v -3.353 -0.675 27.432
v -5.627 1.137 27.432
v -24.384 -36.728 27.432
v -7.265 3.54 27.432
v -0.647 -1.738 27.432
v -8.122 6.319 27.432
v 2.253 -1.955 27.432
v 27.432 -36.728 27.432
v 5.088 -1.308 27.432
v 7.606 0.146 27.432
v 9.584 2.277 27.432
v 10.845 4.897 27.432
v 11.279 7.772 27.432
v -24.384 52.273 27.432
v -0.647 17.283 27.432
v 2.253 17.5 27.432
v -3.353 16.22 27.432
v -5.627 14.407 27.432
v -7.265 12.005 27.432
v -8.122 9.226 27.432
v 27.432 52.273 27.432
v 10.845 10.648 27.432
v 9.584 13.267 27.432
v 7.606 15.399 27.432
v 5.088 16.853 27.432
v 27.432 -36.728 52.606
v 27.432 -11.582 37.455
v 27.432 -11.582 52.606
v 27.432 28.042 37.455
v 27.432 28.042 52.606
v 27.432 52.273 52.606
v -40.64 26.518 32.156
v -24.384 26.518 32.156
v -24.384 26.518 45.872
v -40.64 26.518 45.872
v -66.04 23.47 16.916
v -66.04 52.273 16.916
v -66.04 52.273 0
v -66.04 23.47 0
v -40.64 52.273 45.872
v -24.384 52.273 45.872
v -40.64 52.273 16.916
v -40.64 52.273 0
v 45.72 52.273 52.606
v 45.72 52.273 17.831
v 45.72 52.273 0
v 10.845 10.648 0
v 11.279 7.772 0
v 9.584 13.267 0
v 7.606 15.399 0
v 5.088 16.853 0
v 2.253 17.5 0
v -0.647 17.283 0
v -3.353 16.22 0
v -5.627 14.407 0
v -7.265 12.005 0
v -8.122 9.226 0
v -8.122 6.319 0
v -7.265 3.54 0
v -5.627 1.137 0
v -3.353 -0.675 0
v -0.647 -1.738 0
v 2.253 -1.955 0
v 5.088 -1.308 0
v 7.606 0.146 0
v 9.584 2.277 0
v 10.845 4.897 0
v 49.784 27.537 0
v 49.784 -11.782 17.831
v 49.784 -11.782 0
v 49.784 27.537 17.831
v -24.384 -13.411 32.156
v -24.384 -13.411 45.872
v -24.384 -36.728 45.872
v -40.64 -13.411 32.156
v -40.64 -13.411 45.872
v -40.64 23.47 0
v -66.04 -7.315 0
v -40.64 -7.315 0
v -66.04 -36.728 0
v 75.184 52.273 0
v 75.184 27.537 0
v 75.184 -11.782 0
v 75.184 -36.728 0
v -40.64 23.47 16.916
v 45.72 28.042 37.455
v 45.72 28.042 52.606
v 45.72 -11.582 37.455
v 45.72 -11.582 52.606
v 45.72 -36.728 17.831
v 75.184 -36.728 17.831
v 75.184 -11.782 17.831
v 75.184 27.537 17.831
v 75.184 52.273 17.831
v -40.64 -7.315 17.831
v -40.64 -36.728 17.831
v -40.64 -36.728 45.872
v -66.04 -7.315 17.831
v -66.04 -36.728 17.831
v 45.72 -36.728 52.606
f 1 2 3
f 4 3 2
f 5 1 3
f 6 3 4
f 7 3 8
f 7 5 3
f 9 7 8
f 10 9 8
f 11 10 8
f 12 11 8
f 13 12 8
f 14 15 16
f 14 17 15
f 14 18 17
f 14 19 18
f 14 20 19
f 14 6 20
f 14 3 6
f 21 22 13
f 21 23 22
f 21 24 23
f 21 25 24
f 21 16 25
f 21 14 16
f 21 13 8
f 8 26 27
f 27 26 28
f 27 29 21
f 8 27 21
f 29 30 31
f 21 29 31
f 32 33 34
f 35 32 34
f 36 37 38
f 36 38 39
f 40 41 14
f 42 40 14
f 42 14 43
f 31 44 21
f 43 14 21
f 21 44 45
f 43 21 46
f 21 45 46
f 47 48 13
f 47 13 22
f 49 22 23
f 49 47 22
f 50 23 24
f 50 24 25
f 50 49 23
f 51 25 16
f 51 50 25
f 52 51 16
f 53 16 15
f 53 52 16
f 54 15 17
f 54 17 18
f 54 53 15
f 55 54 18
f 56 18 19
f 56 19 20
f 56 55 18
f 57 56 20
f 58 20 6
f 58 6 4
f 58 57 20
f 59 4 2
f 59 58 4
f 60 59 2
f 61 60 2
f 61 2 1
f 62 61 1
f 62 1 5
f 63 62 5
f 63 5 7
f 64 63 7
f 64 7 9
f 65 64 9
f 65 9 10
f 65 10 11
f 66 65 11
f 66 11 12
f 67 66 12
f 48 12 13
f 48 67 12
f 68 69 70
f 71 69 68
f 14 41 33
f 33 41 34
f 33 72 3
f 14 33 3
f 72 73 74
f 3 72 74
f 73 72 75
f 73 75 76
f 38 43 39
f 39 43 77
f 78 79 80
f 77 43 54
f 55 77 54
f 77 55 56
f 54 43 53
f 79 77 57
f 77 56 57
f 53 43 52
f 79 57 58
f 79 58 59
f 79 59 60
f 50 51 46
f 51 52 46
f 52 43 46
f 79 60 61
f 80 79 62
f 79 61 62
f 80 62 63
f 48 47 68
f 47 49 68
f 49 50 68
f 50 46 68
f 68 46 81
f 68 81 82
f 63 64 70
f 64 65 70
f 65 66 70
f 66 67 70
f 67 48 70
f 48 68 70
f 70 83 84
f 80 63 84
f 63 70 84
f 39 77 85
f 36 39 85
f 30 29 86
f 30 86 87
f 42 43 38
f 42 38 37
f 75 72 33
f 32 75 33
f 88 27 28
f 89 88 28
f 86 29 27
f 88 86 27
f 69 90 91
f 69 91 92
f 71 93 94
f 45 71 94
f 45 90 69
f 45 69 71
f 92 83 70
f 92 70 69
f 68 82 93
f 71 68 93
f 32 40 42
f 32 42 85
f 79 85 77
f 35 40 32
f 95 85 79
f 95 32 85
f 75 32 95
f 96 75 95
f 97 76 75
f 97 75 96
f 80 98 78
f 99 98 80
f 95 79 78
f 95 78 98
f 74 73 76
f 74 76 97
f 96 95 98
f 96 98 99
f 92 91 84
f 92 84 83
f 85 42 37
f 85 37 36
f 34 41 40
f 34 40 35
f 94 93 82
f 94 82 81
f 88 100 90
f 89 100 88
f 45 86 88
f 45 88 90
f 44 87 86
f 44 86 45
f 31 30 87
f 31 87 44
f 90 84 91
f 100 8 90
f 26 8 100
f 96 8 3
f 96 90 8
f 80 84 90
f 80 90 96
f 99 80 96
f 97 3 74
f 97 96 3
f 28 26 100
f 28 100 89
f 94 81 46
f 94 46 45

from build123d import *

# Parameters (mm, degrees)
F0_W      = 51.8160052598
F0_H      = 89.0015969053
F0_R      = 9.7547897259
F1_DEPTH  = 27.432
F2_W      = 25.1459991559
F2_H      = 15.1513946929
F2_W_2    = 24.2315987125
F3_DEPTH  = 18.288
F4_W      = 25.7555991411
F4_H      = 13.7160010636
F4_W_2    = 23.3171992004
F5_DEPTH  = 16.256
F6_W      = 89.0015969053
F6_H      = 17.8308002651
F7_DEPTH  = 4.064
F8_W      = 24.9466653913
F8_H      = 17.8308002651
F8_W_2    = 24.7357338667
F9_DEPTH  = 25.4
F10_W     = 28.8035981357
F10_H     = 16.9163998216
F10_W_2   = 29.4131976552
F10_H_2   = 17.8308002651
F11_DEPTH = 25.4


with BuildPart() as f1:
    # F0 (on Top) → F1 (new body)
    with BuildSketch(Plane.XY):
        with Locations((1.5240013599, 7.7724005096)):
            Rectangle(F0_W, F0_H)
        with Locations((1.5240013599, 7.7724005096)):
            Circle(F0_R, mode=Mode.SUBTRACT)
    extrude(amount=F1_DEPTH)

    # F2 (on face) → F3 (join)
    with BuildSketch(Plane.YZ.offset(27.4320039898)):
        with Locations((-24.1553983651, 45.0302423907)):
            Rectangle(F2_W, F2_H)
        Polygon((-11.5823987871, 37.4545450442), (-36.7283979431, 37.4545450442), (-36.7283979431, 0), (52.2731989622, 0), (52.2731989622, 37.4545450442), (28.0416002497, 37.4545450442), align=None)
        with Locations((40.157399606, 45.0302423907)):
            Rectangle(F2_W_2, F2_H)
    extrude(amount=F3_DEPTH)

    # F4 (on face) → F5 (join)
    with BuildSketch(Plane(origin=(-24.3840012699, 0, 0), x_dir=(0, -1, 0), z_dir=(-1, 0, 0))):
        with Locations((-39.3953993917, 39.0144009143)):
            Rectangle(F4_W, F4_H)
        Polygon((-26.5175998211, 32.1564003825), (-52.2731989622, 32.1564003825), (-52.2731989622, 0), (36.7283979431, 0), (36.7283979431, 32.1564003825), (13.4111987427, 32.1564003825), align=None)
        with Locations((25.0697983429, 39.0144009143)):
            Rectangle(F4_W_2, F4_H)
    extrude(amount=F5_DEPTH)

    # F6 (on face) → F7 (join)
    with BuildSketch(Plane.YZ.offset(45.7200039898)):
        with Locations((7.7724005096, 8.9154001325)):
            Rectangle(F6_W, F6_H)
    extrude(amount=F7_DEPTH)

    # F8 (on face) → F9 (join)
    with BuildSketch(Plane.YZ.offset(49.7840039898)):
        with Locations((-24.2550652474, 8.9154001325)):
            Rectangle(F8_W, F8_H)
        with Locations((39.9053320289, 8.9154001325)):
            Rectangle(F8_W_2, F8_H)
    extrude(amount=F9_DEPTH)

    # F10 (on face) → F11 (join)
    with BuildSketch(Plane(origin=(-40.6400012699, 0, 0), x_dir=(0, -1, 0), z_dir=(-1, 0, 0))):
        with Locations((-37.8713998944, 8.4581999108)):
            Rectangle(F10_W, F10_H)
        with Locations((22.0217991155, 8.9154001325)):
            Rectangle(F10_W_2, F10_H_2)
    extrude(amount=F11_DEPTH)


solid = f1.part
